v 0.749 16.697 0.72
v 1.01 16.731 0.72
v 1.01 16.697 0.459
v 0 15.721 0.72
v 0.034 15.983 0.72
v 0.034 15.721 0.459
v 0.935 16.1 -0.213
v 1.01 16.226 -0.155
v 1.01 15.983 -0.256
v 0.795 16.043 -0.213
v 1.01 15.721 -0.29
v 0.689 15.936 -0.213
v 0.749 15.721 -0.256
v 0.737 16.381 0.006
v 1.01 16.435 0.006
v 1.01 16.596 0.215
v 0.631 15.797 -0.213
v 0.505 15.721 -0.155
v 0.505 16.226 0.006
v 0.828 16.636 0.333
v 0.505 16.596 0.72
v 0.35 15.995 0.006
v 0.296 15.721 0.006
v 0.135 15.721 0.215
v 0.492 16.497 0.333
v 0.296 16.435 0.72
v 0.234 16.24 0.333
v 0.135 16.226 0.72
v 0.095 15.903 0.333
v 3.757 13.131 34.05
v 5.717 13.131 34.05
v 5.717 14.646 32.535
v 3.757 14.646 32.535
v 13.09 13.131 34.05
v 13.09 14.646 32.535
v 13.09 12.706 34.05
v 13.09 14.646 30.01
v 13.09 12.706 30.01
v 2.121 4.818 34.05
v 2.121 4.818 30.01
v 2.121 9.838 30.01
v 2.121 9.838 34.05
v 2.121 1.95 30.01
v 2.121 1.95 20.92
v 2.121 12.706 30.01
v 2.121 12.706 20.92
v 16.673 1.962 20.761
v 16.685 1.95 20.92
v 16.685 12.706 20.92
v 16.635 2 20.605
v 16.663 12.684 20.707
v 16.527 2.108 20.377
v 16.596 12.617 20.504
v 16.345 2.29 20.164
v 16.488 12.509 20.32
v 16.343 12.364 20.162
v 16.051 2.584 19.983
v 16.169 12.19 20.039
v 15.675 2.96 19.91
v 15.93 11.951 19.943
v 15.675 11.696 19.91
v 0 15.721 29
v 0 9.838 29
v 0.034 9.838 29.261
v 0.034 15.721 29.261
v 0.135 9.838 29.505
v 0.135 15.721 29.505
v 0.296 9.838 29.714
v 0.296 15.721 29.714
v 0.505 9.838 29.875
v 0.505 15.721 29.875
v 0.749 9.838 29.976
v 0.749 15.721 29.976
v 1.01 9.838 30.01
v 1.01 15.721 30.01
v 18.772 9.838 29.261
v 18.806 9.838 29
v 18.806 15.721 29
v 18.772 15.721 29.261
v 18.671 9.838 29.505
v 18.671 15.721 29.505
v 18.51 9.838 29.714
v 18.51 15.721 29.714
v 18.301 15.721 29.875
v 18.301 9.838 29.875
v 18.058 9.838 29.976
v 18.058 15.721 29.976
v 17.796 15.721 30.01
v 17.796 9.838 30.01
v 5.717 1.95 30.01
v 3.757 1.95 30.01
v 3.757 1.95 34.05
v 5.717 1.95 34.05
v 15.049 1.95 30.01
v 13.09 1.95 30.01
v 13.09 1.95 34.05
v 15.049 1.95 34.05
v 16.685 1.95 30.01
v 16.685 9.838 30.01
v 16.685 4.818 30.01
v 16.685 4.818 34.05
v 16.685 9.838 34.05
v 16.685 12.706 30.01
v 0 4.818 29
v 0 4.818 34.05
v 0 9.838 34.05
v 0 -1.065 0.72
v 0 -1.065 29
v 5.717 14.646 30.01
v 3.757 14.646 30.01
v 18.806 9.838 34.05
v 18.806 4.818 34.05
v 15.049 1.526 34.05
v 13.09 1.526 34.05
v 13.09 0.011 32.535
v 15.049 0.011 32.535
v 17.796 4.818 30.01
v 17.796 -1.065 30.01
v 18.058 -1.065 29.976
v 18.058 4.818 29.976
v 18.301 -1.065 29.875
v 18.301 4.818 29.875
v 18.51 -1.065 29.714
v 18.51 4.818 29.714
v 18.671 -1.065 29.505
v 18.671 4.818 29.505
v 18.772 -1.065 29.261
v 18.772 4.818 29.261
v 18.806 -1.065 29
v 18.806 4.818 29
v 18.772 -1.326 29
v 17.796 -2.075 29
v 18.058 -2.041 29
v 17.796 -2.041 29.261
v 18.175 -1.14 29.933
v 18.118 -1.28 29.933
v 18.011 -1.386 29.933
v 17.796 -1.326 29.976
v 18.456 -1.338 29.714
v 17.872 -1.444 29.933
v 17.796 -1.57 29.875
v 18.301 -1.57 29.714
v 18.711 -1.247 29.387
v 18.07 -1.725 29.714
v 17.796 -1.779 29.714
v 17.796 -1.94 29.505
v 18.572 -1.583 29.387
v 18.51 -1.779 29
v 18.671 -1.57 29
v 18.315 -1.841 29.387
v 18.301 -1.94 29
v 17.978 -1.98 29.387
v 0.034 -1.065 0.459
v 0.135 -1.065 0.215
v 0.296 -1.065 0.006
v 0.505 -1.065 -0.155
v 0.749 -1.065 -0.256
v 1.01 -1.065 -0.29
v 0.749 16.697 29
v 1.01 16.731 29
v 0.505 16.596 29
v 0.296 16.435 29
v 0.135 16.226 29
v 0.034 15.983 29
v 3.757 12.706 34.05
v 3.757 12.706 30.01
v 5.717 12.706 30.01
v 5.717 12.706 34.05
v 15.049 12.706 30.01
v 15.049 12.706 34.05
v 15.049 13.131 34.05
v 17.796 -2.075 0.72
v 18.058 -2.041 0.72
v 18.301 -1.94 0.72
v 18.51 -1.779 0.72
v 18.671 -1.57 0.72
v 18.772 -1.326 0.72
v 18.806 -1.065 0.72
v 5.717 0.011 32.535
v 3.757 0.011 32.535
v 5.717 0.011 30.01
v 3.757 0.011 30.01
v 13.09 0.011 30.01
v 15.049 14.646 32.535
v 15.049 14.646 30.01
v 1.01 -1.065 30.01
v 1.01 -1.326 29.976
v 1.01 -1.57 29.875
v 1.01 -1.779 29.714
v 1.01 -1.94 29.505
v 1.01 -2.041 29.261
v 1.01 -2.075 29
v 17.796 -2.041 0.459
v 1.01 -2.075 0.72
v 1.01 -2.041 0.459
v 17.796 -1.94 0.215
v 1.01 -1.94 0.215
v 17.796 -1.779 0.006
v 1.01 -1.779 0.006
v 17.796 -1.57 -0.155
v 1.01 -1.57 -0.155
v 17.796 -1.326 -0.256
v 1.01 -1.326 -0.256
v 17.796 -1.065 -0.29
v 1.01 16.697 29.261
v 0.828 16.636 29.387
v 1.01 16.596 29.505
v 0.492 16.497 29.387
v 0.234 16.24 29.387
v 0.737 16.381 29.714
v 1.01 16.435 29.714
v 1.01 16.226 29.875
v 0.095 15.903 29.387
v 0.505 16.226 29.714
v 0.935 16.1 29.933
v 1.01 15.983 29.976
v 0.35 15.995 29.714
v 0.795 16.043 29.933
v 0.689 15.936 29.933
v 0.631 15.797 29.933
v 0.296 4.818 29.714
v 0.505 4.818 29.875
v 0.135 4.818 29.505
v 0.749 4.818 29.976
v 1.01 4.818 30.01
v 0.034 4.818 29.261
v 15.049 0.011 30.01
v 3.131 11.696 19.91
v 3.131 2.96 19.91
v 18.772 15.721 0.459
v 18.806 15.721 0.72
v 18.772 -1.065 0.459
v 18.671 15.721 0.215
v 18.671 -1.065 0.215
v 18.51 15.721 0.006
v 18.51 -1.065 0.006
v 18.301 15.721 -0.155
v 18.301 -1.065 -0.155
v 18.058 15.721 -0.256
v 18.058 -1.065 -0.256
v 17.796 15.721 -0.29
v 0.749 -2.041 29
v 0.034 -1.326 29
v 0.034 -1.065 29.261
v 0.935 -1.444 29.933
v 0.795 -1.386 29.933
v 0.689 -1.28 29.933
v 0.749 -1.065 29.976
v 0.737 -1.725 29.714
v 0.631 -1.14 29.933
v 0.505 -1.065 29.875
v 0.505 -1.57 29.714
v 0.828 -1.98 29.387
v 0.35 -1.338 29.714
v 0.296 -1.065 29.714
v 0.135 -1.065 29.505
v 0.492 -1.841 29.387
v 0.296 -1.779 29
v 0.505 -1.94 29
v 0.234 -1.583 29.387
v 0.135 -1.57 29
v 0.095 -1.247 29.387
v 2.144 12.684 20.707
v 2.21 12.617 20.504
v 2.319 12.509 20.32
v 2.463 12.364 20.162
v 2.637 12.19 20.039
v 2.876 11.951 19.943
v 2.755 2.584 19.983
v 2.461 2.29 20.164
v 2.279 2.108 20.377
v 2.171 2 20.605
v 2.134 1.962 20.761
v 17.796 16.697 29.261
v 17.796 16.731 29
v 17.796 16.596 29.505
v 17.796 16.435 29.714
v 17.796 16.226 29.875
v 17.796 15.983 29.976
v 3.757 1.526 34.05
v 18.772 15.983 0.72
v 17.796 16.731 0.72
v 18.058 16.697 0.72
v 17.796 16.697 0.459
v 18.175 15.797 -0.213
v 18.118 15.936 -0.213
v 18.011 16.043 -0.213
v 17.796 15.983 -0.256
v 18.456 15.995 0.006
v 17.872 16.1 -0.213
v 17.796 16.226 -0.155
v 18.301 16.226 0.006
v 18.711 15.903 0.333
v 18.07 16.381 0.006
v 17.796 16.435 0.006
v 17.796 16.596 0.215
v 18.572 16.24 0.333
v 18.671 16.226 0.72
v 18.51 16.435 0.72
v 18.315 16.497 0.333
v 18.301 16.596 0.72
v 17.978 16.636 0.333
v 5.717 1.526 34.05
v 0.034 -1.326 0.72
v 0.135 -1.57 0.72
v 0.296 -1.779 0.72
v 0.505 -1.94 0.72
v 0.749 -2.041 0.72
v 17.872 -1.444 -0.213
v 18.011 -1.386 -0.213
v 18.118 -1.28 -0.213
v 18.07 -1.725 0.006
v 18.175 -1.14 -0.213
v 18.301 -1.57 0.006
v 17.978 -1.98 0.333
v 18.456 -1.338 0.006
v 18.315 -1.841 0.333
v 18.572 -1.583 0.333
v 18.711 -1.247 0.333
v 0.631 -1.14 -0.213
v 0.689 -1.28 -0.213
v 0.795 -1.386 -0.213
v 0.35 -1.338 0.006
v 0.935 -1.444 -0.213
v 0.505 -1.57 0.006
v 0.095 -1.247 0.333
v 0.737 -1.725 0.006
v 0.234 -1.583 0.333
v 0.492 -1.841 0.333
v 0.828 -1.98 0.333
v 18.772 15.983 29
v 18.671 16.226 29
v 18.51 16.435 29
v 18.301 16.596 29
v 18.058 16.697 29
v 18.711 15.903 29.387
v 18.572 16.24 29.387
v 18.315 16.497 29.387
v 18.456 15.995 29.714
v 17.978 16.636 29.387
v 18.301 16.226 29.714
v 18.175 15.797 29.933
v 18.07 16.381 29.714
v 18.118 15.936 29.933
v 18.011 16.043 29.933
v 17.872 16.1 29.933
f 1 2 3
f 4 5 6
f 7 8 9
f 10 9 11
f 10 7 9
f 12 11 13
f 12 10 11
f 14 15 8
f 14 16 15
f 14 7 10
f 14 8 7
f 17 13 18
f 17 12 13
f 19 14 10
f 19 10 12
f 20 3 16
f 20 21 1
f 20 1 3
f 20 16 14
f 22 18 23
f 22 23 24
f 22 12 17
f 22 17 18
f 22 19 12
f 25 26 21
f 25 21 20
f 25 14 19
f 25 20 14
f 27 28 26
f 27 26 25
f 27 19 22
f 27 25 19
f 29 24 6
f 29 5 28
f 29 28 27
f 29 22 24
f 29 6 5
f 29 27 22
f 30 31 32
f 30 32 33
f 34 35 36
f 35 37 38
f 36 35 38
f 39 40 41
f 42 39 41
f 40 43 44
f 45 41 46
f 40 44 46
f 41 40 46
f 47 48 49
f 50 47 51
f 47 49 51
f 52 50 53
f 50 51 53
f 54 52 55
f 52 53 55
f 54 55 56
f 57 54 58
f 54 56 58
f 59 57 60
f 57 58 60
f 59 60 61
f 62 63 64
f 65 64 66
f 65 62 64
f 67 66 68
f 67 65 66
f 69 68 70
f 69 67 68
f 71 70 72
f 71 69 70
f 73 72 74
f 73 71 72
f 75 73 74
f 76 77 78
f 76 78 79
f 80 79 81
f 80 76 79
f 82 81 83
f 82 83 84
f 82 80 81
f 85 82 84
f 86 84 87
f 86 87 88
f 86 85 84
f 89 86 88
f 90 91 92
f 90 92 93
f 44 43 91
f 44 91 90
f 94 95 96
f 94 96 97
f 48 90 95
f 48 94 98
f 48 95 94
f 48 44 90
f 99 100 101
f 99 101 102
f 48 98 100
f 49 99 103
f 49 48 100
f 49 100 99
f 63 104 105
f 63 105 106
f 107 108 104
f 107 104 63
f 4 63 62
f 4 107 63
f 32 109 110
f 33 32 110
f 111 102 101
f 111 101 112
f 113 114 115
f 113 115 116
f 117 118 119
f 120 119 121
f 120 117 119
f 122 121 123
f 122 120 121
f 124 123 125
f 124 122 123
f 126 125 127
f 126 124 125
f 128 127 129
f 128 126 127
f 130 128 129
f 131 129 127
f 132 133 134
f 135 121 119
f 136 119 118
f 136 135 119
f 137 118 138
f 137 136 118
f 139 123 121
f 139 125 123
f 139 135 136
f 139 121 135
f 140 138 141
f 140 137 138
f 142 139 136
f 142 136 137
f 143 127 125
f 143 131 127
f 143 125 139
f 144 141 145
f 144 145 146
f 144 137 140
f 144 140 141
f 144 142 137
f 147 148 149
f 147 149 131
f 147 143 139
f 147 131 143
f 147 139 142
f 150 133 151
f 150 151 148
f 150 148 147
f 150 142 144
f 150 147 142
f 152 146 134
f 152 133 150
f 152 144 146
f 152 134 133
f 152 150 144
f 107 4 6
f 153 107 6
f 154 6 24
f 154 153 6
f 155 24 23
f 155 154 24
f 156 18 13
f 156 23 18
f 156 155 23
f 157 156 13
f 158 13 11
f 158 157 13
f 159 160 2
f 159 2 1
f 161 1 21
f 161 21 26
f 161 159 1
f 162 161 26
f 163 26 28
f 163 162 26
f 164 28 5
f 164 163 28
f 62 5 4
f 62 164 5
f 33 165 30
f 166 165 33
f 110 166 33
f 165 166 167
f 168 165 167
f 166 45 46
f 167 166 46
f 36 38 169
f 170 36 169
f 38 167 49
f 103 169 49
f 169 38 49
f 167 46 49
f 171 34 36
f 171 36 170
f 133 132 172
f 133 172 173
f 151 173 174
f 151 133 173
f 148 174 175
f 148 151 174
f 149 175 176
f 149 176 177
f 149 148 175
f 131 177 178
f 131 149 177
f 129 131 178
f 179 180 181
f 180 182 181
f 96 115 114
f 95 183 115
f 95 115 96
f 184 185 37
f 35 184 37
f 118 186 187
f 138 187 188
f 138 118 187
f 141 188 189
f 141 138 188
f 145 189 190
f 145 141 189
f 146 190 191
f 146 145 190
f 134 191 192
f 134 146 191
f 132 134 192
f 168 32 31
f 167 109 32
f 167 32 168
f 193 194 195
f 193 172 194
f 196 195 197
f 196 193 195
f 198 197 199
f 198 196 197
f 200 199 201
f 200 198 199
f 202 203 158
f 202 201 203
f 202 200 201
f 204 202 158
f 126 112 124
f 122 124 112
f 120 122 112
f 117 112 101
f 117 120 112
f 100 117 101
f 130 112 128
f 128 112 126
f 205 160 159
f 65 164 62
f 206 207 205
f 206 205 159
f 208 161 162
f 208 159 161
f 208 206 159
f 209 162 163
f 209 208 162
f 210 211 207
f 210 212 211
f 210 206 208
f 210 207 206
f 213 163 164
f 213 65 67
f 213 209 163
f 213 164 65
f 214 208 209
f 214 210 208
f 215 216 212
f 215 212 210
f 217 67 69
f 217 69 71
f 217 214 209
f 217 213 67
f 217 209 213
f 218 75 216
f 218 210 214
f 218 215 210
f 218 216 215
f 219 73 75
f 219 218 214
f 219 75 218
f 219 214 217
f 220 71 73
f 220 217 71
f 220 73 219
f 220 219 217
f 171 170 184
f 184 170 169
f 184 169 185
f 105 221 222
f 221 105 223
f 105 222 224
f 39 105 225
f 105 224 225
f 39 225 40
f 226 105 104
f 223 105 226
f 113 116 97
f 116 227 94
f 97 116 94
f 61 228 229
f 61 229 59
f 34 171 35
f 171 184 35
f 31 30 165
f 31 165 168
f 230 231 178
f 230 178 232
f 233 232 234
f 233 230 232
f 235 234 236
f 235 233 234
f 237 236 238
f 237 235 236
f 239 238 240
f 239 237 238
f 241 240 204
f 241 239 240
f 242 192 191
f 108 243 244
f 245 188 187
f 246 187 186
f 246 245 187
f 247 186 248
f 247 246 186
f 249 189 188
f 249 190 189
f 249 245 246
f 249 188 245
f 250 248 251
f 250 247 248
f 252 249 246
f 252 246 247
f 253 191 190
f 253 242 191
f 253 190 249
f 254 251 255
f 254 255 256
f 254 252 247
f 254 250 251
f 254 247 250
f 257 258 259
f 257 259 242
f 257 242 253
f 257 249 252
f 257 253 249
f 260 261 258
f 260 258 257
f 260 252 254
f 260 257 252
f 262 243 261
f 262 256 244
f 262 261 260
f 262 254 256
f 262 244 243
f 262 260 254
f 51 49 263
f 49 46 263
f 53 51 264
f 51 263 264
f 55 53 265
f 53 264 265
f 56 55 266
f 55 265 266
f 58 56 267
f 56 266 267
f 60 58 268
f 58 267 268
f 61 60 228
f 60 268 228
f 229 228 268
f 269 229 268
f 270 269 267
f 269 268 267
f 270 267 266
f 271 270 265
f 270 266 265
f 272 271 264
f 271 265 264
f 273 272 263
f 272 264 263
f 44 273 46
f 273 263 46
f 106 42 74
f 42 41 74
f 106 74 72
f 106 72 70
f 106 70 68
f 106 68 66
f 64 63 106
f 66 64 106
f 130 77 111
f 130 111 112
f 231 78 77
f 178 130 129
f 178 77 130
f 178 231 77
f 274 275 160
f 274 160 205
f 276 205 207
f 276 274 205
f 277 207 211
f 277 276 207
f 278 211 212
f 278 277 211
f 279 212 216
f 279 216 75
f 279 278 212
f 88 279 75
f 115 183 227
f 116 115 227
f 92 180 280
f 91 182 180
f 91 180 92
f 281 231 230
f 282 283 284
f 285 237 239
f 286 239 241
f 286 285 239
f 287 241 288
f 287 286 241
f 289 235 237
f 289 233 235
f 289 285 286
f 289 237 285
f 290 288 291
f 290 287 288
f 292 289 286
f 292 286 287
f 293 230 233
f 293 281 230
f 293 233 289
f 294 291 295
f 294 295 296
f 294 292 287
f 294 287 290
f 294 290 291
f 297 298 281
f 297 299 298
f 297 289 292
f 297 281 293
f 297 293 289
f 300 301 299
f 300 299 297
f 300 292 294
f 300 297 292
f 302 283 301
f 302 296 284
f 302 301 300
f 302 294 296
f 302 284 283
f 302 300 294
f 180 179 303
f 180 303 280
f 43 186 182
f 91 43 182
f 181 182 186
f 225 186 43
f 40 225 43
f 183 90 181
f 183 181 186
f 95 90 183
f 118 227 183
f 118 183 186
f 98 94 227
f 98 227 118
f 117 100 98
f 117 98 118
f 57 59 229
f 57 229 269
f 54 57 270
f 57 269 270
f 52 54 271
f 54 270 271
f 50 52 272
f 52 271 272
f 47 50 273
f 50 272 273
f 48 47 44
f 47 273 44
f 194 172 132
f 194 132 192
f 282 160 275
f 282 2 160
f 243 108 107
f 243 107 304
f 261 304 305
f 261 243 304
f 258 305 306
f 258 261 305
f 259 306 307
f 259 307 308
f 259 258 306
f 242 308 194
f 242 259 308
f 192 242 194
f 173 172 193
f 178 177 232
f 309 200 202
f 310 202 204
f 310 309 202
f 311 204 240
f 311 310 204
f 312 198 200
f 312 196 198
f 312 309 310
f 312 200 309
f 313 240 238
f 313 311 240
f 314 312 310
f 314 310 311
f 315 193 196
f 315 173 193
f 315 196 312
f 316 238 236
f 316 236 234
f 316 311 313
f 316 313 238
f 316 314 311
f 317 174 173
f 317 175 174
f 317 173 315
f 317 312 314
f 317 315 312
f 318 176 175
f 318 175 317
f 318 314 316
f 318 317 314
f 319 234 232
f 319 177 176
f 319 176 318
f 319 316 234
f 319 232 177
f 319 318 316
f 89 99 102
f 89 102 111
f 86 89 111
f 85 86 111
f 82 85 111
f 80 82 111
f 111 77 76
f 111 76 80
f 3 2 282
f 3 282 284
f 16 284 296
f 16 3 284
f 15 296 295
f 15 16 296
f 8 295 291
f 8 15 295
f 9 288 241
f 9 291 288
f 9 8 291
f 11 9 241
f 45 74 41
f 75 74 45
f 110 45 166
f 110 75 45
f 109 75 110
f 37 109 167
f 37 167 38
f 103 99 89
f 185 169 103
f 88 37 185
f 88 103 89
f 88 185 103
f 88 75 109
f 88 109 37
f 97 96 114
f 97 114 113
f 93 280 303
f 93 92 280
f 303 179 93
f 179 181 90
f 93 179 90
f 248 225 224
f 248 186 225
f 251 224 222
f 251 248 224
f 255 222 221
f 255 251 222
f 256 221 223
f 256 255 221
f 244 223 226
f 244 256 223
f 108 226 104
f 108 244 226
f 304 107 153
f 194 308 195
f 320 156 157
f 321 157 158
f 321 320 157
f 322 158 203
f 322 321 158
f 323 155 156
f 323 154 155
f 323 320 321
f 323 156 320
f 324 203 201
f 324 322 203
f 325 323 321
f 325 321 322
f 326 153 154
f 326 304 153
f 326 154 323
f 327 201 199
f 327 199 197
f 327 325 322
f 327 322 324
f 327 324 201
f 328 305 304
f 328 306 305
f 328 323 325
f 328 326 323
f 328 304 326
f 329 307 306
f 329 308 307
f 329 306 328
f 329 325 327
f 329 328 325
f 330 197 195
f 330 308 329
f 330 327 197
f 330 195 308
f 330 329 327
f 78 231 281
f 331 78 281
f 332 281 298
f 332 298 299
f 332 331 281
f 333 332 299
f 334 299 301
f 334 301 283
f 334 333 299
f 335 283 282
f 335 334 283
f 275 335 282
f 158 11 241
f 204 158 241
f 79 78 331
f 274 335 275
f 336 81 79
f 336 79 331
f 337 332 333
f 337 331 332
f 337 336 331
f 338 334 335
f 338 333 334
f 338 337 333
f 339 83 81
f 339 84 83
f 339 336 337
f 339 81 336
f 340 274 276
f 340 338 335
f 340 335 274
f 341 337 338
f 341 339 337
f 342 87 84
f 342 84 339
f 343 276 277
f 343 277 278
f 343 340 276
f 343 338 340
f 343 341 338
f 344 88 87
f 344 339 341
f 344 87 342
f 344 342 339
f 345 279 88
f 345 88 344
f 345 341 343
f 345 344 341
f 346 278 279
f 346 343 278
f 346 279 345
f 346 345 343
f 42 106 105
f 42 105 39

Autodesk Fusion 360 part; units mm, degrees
sketch "Sketch1" plane through (0, 0, 0) normal (0, 0, 1) x (1, 0, 0)
  line L0 (0, 0) -> (18.62, 0)
  line L1 (18.62, 0) -> (18.62, 14.49)
  line L2 (18.62, 14.49) -> (0, 14.49)
  line L3 (0, 14.49) -> (0, 0)
  line L4 (9.31, 0) -> (9.31, 14.49)
  line L5 (0, 7.245) -> (18.62, 7.245)
  line L6 (2.1, 9.73) -> (-2.1, 9.73)
  line L7 (-2.1, 9.73) -> (-2.1, 4.76)
  line L8 (-2.1, 4.76) -> (2.1, 4.76)
  line L9 (2.1, 4.76) -> (2.1, 9.73)
  line L10 (2.1, 9.73) -> (-2.1, 4.76) construction
  line L11 (-2.1, 9.73) -> (2.1, 4.76) construction
  line L12 (3.72, 0) -> (3.72, 14.49)
  line L13 (3.72, 14.49) -> (5.66, 14.49)
  line L14 (5.66, 14.49) -> (5.66, 12.57)
  line L15 (5.66, 12.57) -> (3.72, 12.57)
  line L16 (3.72, 12.57) -> (3.72, 14.49)
  line L17 (5.66, 1.92) -> (3.72, 1.92)
  line L18 (3.72, 1.92) -> (3.72, 0)
  line L19 (5.66, 0) -> (5.66, 1.92)
  line L20 (16.52, 9.73) -> (20.72, 9.73)
  line L21 (16.52, 4.76) -> (16.52, 9.73)
  line L22 (20.72, 4.76) -> (16.52, 4.76)
  line L23 (12.96, 14.49) -> (12.96, 12.57)
  line L24 (12.96, 12.57) -> (14.9, 12.57)
  line L25 (14.9, 12.57) -> (14.9, 14.49)
  line L26 (12.96, 1.92) -> (14.9, 1.92)
  line L27 (12.96, 0) -> (12.96, 1.92)
  line L28 (14.9, 0) -> (14.9, 14.49)
  line L29 (3.72, 12.57) -> (14.9, 12.57)
  line L30 (14.9, 12.57) -> (14.9, 1.92)
  line L31 (14.9, 1.92) -> (3.72, 1.92)
  line L32 (3.72, 1.92) -> (3.72, 12.57)
  line L33 (2.1, 9.73) -> (3.72, 9.73)
  line L34 (3.72, 9.73) -> (3.72, 12.57)
  line L35 (3.72, 12.57) -> (2.1, 12.57)
  line L36 (2.1, 12.57) -> (2.1, 9.73)
  line L37 (2.1, 4.76) -> (3.72, 4.76)
  line L38 (3.72, 4.76) -> (3.72, 1.92)
  line L39 (3.72, 1.92) -> (2.1, 1.92)
  line L40 (2.1, 1.92) -> (2.1, 4.76)
  line L41 (14.9, 1.92) -> (16.52, 1.92)
  line L42 (16.52, 1.92) -> (16.52, 4.76)
  line L43 (16.52, 4.76) -> (14.9, 4.76)
  line L44 (14.9, 4.76) -> (14.9, 1.92)
  line L45 (16.52, 9.73) -> (14.9, 9.73)
  line L46 (14.9, 9.73) -> (14.9, 12.57)
  line L47 (14.9, 12.57) -> (16.52, 12.57)
  line L48 (16.52, 12.57) -> (16.52, 9.73)
  circle A0 centre (9.31, 7.245) radius 2.5
  line L49 (18.62, -2.065) -> (0, -2.065)
  line L50 (0, -2.065) -> (0, 16.555)
  line L51 (0, 16.555) -> (18.62, 16.555)
  line L52 (18.62, 16.555) -> (18.62, -2.065)
  line L53 (18.62, -2.065) -> (0, 16.555) construction
  line L54 (0, -2.065) -> (18.62, 16.555) construction
  point P0 (0, 7.245)
  point P1 (9.31, 7.245)
  dimension "d1" = 18.62
  dimension "d2" = 14.49
  dimension "d3" = 4.2
  dimension "d4" = 4.97
  dimension "d5" = -5.59
  dimension "d6" = 1.94
  dimension "d7" = 1.92
  dimension "d16" = 5
  dimension "d19" = 18.62
  dimension "d20" = 18.62
extrude "Extrude1" add sketch "Sketch1" along normal blind 34 contours L0 L12 L17 L18 L19 L31 | L3 L5 L8 L9 L50 | L3 L5 L6 L9 L50 | L0 L26 L27 L28 L31 | L1 L5 L21 L22 L52 | L2 L12 L13 L14 L15 L16 L29 | L1 L5 L20 L21 L52 | L2 L23 L24 L25 L28 L29 makes body 1 at (13.6067, 0, 22.6667) makes body 2 at (5.0133, 14.49, 22.6667) makes body 3 at (18.62, 6.4167, 11.3333) makes body 4 at (4.3667, 0, 22.6667) makes body 5 at (0, 8.0733, 11.3333) makes body 6 at (14.2533, 14.49, 22.6667)
extrude "Extrude4" add sketch "Sketch1" along normal blind 30 contours L0 L3 L8 L12 L18 L39 L40 L50 | L0 L4 L19 L31 | L0 L4 L27 L31 | L2 L3 L6 L12 L16 L35 L36 L50 | L0 L1 L22 L28 L41 L42 L52 | L2 L4 L14 L29 | L1 L2 L20 L25 L28 L47 L48 L52 | L2 L4 L23 L29 bodies 1 2 3 4 5 6
extrude "Extrude5" add sketch "Sketch1" along normal blind 20 contours L12 L32 L37 L38 L39 L40 | L4 L5 L12 L17 L31 L32 L38 A0 | L5 L9 L12 L32 L37 | L5 L9 L12 L32 L33 | L4 L5 L26 L28 L30 L31 L44 A0 | L4 L5 L12 L15 L29 L32 L34 A0 | L12 L32 L33 L34 L35 L36 | L4 L5 A0 | L4 L5 A0 | L4 L5 A0 | L28 L30 L41 L42 L43 L44 | L5 L21 L28 L30 L43 | L4 L5 A0 | L4 L5 L24 L28 L29 L30 L46 A0 | L5 L21 L28 L30 L45 | L28 L30 L45 L46 L47 L48 bodies 1
extrude "Extrude6" add sketch "Sketch1" along normal blind 30 contours L0 L49 L50 L52 | L2 L13 L50 L51 L52 bodies 1
fillet "Fillet1" radius 1 4 edges at (18.62, 16.555, 15) (0, 16.555, 15) (0, -2.065, 15) (18.62, -2.065, 15) on bodies 1
fillet "Fillet2" radius 1 10 edges at (18.62, 12.6425, 30) (18.3271, 16.2621, 30) (9.31, 16.555, 30) (0.2929, 16.2621, 30) (0, 12.6425, 30) (0, 1.8475, 30) (0.2929, -1.7721, 30) (9.31, -2.065, 30) (18.3271, -1.7721, 30) (18.62, 1.8475, 30) on bodies 1
chamfer "Chamfer1" distance 1.5 angle 45 1 edges at (4.69, 0, 34) on bodies 1
chamfer "Chamfer2" distance 1.5 angle 45 1 edges at (13.93, 0, 34) on bodies 1
chamfer "Chamfer3" distance 1.5 angle 45 2 edges at (4.69, 14.49, 34) (13.93, 14.49, 34) on bodies 1
fillet "Fillet3" radius 1 4 edges at (9.31, 1.92, 20) (16.52, 7.245, 20) (2.1, 7.245, 20) (9.31, 12.57, 20) on bodies 1
fillet "Fillet4" radius 1 8 edges at (0.2929, -1.7721, 0) (0, 7.245, 0) (0.2929, 16.2621, 0) (9.31, 16.555, 0) (18.3271, 16.2621, 0) (18.62, 7.245, 0) (18.3271, -1.7721, 0) (9.31, -2.065, 0) on bodies 1
scale "Scale1" factor 1.01 about (0, -1.065, 29) bodies 1
